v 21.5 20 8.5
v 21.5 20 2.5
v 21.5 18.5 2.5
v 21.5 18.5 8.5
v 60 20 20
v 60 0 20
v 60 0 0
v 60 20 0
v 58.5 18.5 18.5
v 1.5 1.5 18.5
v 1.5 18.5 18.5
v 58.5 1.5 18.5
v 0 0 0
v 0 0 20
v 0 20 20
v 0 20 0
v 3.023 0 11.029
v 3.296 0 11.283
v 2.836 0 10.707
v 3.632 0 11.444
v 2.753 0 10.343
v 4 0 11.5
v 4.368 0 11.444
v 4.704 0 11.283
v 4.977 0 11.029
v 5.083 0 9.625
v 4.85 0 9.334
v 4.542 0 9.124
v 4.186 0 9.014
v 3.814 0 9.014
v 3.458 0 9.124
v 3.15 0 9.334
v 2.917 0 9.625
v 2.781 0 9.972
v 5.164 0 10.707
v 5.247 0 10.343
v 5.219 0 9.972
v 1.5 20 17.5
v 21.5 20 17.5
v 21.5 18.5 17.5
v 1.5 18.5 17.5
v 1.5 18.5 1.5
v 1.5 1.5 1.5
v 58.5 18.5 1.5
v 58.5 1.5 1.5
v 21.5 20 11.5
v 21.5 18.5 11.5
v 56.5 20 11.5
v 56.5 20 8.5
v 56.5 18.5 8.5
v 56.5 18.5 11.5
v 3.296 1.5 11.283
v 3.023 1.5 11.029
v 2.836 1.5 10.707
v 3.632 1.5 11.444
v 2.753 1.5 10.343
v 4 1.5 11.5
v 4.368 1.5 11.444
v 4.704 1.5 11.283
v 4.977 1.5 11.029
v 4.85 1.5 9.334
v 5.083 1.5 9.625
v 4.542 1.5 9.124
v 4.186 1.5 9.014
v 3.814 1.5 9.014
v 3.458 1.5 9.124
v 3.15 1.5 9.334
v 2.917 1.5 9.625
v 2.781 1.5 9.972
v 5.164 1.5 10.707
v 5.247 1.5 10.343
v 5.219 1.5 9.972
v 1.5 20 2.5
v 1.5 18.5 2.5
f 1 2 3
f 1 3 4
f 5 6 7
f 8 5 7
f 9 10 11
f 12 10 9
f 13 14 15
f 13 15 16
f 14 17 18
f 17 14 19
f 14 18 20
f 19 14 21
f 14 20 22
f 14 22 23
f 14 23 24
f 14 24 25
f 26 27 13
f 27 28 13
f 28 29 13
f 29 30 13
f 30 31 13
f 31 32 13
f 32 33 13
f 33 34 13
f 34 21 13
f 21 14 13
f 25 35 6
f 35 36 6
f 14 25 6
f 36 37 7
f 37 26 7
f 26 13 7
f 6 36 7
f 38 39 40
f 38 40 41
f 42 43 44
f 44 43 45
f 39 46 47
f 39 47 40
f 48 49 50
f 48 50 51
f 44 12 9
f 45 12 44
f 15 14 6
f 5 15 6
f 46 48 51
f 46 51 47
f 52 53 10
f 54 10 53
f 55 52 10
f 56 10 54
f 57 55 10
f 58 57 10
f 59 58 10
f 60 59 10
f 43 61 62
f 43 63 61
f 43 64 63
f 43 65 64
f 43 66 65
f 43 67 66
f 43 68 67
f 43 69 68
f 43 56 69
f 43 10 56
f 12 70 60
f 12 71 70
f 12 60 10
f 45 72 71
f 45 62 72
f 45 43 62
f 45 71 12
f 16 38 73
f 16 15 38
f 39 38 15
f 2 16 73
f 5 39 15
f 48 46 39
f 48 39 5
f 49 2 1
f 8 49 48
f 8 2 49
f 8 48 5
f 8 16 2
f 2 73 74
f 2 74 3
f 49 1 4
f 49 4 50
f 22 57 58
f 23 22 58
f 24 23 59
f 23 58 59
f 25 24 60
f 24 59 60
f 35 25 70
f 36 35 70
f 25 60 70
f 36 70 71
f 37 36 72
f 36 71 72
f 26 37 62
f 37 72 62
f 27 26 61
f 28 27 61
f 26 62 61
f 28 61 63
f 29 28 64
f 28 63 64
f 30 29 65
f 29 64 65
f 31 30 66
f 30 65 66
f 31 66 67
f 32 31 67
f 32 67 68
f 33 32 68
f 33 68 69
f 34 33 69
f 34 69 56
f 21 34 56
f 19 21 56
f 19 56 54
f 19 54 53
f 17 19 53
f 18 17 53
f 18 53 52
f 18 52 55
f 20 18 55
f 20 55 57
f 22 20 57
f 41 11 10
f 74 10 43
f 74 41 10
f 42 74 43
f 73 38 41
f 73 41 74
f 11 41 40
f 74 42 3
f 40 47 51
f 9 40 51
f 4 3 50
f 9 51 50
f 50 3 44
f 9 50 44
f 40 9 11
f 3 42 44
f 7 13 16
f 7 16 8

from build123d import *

# Parameters (mm, degrees)
CROQUIS1_W              = 60
CROQUIS1_H              = 20
SALIENTE_EXTRUIR1_DEPTH = 20
VACIADO1_T              = 1.5
CORTAR_EXTRUIR1_DEPTH   = 18
CROQUIS3_R              = 1.25
CORTAR_EXTRUIR2_DEPTH   = 2.5


with BuildPart() as part:
    # Croquis1 → Saliente-Extruir1 (new body)
    with BuildSketch(Plane(origin=(0, 0, 0), x_dir=(1, 0, 0), z_dir=(0, 1, 0))):
        with Locations((30, -10)):
            Rectangle(CROQUIS1_W, CROQUIS1_H)
    extrude(amount=SALIENTE_EXTRUIR1_DEPTH)

    # Vaciado1 (no face opened: a closed hollow body)
    add(offset(amount=-VACIADO1_T, mode=Mode.PRIVATE), mode=Mode.SUBTRACT)

    # Croquis2 → Cortar-Extruir1 (cut)
    with BuildSketch(Plane(origin=(0, 20, 0), x_dir=(1, 0, 0), z_dir=(0, 1, 0))):
        Polygon((1.5, -2.5), (21.5, -2.5), (21.5, -8.5), (56.5, -8.5), (56.5, -11.5), (21.5, -11.5), (21.5, -17.5), (1.5, -17.5), align=None)
    extrude(amount=-CORTAR_EXTRUIR1_DEPTH, mode=Mode.SUBTRACT)

    # Croquis3 → Cortar-Extruir2 (cut, through all)
    with BuildSketch(Plane(origin=(0, 1.5, 0), x_dir=(1, 0, 0), z_dir=(0, 1, 0))):
        with Locations(Location((4, -10.25, 0), (0, 0, 270))):  # turned: the seam where the file's is
            Circle(CROQUIS3_R)
    extrude(amount=-CORTAR_EXTRUIR2_DEPTH, mode=Mode.SUBTRACT)


solid = part.part
